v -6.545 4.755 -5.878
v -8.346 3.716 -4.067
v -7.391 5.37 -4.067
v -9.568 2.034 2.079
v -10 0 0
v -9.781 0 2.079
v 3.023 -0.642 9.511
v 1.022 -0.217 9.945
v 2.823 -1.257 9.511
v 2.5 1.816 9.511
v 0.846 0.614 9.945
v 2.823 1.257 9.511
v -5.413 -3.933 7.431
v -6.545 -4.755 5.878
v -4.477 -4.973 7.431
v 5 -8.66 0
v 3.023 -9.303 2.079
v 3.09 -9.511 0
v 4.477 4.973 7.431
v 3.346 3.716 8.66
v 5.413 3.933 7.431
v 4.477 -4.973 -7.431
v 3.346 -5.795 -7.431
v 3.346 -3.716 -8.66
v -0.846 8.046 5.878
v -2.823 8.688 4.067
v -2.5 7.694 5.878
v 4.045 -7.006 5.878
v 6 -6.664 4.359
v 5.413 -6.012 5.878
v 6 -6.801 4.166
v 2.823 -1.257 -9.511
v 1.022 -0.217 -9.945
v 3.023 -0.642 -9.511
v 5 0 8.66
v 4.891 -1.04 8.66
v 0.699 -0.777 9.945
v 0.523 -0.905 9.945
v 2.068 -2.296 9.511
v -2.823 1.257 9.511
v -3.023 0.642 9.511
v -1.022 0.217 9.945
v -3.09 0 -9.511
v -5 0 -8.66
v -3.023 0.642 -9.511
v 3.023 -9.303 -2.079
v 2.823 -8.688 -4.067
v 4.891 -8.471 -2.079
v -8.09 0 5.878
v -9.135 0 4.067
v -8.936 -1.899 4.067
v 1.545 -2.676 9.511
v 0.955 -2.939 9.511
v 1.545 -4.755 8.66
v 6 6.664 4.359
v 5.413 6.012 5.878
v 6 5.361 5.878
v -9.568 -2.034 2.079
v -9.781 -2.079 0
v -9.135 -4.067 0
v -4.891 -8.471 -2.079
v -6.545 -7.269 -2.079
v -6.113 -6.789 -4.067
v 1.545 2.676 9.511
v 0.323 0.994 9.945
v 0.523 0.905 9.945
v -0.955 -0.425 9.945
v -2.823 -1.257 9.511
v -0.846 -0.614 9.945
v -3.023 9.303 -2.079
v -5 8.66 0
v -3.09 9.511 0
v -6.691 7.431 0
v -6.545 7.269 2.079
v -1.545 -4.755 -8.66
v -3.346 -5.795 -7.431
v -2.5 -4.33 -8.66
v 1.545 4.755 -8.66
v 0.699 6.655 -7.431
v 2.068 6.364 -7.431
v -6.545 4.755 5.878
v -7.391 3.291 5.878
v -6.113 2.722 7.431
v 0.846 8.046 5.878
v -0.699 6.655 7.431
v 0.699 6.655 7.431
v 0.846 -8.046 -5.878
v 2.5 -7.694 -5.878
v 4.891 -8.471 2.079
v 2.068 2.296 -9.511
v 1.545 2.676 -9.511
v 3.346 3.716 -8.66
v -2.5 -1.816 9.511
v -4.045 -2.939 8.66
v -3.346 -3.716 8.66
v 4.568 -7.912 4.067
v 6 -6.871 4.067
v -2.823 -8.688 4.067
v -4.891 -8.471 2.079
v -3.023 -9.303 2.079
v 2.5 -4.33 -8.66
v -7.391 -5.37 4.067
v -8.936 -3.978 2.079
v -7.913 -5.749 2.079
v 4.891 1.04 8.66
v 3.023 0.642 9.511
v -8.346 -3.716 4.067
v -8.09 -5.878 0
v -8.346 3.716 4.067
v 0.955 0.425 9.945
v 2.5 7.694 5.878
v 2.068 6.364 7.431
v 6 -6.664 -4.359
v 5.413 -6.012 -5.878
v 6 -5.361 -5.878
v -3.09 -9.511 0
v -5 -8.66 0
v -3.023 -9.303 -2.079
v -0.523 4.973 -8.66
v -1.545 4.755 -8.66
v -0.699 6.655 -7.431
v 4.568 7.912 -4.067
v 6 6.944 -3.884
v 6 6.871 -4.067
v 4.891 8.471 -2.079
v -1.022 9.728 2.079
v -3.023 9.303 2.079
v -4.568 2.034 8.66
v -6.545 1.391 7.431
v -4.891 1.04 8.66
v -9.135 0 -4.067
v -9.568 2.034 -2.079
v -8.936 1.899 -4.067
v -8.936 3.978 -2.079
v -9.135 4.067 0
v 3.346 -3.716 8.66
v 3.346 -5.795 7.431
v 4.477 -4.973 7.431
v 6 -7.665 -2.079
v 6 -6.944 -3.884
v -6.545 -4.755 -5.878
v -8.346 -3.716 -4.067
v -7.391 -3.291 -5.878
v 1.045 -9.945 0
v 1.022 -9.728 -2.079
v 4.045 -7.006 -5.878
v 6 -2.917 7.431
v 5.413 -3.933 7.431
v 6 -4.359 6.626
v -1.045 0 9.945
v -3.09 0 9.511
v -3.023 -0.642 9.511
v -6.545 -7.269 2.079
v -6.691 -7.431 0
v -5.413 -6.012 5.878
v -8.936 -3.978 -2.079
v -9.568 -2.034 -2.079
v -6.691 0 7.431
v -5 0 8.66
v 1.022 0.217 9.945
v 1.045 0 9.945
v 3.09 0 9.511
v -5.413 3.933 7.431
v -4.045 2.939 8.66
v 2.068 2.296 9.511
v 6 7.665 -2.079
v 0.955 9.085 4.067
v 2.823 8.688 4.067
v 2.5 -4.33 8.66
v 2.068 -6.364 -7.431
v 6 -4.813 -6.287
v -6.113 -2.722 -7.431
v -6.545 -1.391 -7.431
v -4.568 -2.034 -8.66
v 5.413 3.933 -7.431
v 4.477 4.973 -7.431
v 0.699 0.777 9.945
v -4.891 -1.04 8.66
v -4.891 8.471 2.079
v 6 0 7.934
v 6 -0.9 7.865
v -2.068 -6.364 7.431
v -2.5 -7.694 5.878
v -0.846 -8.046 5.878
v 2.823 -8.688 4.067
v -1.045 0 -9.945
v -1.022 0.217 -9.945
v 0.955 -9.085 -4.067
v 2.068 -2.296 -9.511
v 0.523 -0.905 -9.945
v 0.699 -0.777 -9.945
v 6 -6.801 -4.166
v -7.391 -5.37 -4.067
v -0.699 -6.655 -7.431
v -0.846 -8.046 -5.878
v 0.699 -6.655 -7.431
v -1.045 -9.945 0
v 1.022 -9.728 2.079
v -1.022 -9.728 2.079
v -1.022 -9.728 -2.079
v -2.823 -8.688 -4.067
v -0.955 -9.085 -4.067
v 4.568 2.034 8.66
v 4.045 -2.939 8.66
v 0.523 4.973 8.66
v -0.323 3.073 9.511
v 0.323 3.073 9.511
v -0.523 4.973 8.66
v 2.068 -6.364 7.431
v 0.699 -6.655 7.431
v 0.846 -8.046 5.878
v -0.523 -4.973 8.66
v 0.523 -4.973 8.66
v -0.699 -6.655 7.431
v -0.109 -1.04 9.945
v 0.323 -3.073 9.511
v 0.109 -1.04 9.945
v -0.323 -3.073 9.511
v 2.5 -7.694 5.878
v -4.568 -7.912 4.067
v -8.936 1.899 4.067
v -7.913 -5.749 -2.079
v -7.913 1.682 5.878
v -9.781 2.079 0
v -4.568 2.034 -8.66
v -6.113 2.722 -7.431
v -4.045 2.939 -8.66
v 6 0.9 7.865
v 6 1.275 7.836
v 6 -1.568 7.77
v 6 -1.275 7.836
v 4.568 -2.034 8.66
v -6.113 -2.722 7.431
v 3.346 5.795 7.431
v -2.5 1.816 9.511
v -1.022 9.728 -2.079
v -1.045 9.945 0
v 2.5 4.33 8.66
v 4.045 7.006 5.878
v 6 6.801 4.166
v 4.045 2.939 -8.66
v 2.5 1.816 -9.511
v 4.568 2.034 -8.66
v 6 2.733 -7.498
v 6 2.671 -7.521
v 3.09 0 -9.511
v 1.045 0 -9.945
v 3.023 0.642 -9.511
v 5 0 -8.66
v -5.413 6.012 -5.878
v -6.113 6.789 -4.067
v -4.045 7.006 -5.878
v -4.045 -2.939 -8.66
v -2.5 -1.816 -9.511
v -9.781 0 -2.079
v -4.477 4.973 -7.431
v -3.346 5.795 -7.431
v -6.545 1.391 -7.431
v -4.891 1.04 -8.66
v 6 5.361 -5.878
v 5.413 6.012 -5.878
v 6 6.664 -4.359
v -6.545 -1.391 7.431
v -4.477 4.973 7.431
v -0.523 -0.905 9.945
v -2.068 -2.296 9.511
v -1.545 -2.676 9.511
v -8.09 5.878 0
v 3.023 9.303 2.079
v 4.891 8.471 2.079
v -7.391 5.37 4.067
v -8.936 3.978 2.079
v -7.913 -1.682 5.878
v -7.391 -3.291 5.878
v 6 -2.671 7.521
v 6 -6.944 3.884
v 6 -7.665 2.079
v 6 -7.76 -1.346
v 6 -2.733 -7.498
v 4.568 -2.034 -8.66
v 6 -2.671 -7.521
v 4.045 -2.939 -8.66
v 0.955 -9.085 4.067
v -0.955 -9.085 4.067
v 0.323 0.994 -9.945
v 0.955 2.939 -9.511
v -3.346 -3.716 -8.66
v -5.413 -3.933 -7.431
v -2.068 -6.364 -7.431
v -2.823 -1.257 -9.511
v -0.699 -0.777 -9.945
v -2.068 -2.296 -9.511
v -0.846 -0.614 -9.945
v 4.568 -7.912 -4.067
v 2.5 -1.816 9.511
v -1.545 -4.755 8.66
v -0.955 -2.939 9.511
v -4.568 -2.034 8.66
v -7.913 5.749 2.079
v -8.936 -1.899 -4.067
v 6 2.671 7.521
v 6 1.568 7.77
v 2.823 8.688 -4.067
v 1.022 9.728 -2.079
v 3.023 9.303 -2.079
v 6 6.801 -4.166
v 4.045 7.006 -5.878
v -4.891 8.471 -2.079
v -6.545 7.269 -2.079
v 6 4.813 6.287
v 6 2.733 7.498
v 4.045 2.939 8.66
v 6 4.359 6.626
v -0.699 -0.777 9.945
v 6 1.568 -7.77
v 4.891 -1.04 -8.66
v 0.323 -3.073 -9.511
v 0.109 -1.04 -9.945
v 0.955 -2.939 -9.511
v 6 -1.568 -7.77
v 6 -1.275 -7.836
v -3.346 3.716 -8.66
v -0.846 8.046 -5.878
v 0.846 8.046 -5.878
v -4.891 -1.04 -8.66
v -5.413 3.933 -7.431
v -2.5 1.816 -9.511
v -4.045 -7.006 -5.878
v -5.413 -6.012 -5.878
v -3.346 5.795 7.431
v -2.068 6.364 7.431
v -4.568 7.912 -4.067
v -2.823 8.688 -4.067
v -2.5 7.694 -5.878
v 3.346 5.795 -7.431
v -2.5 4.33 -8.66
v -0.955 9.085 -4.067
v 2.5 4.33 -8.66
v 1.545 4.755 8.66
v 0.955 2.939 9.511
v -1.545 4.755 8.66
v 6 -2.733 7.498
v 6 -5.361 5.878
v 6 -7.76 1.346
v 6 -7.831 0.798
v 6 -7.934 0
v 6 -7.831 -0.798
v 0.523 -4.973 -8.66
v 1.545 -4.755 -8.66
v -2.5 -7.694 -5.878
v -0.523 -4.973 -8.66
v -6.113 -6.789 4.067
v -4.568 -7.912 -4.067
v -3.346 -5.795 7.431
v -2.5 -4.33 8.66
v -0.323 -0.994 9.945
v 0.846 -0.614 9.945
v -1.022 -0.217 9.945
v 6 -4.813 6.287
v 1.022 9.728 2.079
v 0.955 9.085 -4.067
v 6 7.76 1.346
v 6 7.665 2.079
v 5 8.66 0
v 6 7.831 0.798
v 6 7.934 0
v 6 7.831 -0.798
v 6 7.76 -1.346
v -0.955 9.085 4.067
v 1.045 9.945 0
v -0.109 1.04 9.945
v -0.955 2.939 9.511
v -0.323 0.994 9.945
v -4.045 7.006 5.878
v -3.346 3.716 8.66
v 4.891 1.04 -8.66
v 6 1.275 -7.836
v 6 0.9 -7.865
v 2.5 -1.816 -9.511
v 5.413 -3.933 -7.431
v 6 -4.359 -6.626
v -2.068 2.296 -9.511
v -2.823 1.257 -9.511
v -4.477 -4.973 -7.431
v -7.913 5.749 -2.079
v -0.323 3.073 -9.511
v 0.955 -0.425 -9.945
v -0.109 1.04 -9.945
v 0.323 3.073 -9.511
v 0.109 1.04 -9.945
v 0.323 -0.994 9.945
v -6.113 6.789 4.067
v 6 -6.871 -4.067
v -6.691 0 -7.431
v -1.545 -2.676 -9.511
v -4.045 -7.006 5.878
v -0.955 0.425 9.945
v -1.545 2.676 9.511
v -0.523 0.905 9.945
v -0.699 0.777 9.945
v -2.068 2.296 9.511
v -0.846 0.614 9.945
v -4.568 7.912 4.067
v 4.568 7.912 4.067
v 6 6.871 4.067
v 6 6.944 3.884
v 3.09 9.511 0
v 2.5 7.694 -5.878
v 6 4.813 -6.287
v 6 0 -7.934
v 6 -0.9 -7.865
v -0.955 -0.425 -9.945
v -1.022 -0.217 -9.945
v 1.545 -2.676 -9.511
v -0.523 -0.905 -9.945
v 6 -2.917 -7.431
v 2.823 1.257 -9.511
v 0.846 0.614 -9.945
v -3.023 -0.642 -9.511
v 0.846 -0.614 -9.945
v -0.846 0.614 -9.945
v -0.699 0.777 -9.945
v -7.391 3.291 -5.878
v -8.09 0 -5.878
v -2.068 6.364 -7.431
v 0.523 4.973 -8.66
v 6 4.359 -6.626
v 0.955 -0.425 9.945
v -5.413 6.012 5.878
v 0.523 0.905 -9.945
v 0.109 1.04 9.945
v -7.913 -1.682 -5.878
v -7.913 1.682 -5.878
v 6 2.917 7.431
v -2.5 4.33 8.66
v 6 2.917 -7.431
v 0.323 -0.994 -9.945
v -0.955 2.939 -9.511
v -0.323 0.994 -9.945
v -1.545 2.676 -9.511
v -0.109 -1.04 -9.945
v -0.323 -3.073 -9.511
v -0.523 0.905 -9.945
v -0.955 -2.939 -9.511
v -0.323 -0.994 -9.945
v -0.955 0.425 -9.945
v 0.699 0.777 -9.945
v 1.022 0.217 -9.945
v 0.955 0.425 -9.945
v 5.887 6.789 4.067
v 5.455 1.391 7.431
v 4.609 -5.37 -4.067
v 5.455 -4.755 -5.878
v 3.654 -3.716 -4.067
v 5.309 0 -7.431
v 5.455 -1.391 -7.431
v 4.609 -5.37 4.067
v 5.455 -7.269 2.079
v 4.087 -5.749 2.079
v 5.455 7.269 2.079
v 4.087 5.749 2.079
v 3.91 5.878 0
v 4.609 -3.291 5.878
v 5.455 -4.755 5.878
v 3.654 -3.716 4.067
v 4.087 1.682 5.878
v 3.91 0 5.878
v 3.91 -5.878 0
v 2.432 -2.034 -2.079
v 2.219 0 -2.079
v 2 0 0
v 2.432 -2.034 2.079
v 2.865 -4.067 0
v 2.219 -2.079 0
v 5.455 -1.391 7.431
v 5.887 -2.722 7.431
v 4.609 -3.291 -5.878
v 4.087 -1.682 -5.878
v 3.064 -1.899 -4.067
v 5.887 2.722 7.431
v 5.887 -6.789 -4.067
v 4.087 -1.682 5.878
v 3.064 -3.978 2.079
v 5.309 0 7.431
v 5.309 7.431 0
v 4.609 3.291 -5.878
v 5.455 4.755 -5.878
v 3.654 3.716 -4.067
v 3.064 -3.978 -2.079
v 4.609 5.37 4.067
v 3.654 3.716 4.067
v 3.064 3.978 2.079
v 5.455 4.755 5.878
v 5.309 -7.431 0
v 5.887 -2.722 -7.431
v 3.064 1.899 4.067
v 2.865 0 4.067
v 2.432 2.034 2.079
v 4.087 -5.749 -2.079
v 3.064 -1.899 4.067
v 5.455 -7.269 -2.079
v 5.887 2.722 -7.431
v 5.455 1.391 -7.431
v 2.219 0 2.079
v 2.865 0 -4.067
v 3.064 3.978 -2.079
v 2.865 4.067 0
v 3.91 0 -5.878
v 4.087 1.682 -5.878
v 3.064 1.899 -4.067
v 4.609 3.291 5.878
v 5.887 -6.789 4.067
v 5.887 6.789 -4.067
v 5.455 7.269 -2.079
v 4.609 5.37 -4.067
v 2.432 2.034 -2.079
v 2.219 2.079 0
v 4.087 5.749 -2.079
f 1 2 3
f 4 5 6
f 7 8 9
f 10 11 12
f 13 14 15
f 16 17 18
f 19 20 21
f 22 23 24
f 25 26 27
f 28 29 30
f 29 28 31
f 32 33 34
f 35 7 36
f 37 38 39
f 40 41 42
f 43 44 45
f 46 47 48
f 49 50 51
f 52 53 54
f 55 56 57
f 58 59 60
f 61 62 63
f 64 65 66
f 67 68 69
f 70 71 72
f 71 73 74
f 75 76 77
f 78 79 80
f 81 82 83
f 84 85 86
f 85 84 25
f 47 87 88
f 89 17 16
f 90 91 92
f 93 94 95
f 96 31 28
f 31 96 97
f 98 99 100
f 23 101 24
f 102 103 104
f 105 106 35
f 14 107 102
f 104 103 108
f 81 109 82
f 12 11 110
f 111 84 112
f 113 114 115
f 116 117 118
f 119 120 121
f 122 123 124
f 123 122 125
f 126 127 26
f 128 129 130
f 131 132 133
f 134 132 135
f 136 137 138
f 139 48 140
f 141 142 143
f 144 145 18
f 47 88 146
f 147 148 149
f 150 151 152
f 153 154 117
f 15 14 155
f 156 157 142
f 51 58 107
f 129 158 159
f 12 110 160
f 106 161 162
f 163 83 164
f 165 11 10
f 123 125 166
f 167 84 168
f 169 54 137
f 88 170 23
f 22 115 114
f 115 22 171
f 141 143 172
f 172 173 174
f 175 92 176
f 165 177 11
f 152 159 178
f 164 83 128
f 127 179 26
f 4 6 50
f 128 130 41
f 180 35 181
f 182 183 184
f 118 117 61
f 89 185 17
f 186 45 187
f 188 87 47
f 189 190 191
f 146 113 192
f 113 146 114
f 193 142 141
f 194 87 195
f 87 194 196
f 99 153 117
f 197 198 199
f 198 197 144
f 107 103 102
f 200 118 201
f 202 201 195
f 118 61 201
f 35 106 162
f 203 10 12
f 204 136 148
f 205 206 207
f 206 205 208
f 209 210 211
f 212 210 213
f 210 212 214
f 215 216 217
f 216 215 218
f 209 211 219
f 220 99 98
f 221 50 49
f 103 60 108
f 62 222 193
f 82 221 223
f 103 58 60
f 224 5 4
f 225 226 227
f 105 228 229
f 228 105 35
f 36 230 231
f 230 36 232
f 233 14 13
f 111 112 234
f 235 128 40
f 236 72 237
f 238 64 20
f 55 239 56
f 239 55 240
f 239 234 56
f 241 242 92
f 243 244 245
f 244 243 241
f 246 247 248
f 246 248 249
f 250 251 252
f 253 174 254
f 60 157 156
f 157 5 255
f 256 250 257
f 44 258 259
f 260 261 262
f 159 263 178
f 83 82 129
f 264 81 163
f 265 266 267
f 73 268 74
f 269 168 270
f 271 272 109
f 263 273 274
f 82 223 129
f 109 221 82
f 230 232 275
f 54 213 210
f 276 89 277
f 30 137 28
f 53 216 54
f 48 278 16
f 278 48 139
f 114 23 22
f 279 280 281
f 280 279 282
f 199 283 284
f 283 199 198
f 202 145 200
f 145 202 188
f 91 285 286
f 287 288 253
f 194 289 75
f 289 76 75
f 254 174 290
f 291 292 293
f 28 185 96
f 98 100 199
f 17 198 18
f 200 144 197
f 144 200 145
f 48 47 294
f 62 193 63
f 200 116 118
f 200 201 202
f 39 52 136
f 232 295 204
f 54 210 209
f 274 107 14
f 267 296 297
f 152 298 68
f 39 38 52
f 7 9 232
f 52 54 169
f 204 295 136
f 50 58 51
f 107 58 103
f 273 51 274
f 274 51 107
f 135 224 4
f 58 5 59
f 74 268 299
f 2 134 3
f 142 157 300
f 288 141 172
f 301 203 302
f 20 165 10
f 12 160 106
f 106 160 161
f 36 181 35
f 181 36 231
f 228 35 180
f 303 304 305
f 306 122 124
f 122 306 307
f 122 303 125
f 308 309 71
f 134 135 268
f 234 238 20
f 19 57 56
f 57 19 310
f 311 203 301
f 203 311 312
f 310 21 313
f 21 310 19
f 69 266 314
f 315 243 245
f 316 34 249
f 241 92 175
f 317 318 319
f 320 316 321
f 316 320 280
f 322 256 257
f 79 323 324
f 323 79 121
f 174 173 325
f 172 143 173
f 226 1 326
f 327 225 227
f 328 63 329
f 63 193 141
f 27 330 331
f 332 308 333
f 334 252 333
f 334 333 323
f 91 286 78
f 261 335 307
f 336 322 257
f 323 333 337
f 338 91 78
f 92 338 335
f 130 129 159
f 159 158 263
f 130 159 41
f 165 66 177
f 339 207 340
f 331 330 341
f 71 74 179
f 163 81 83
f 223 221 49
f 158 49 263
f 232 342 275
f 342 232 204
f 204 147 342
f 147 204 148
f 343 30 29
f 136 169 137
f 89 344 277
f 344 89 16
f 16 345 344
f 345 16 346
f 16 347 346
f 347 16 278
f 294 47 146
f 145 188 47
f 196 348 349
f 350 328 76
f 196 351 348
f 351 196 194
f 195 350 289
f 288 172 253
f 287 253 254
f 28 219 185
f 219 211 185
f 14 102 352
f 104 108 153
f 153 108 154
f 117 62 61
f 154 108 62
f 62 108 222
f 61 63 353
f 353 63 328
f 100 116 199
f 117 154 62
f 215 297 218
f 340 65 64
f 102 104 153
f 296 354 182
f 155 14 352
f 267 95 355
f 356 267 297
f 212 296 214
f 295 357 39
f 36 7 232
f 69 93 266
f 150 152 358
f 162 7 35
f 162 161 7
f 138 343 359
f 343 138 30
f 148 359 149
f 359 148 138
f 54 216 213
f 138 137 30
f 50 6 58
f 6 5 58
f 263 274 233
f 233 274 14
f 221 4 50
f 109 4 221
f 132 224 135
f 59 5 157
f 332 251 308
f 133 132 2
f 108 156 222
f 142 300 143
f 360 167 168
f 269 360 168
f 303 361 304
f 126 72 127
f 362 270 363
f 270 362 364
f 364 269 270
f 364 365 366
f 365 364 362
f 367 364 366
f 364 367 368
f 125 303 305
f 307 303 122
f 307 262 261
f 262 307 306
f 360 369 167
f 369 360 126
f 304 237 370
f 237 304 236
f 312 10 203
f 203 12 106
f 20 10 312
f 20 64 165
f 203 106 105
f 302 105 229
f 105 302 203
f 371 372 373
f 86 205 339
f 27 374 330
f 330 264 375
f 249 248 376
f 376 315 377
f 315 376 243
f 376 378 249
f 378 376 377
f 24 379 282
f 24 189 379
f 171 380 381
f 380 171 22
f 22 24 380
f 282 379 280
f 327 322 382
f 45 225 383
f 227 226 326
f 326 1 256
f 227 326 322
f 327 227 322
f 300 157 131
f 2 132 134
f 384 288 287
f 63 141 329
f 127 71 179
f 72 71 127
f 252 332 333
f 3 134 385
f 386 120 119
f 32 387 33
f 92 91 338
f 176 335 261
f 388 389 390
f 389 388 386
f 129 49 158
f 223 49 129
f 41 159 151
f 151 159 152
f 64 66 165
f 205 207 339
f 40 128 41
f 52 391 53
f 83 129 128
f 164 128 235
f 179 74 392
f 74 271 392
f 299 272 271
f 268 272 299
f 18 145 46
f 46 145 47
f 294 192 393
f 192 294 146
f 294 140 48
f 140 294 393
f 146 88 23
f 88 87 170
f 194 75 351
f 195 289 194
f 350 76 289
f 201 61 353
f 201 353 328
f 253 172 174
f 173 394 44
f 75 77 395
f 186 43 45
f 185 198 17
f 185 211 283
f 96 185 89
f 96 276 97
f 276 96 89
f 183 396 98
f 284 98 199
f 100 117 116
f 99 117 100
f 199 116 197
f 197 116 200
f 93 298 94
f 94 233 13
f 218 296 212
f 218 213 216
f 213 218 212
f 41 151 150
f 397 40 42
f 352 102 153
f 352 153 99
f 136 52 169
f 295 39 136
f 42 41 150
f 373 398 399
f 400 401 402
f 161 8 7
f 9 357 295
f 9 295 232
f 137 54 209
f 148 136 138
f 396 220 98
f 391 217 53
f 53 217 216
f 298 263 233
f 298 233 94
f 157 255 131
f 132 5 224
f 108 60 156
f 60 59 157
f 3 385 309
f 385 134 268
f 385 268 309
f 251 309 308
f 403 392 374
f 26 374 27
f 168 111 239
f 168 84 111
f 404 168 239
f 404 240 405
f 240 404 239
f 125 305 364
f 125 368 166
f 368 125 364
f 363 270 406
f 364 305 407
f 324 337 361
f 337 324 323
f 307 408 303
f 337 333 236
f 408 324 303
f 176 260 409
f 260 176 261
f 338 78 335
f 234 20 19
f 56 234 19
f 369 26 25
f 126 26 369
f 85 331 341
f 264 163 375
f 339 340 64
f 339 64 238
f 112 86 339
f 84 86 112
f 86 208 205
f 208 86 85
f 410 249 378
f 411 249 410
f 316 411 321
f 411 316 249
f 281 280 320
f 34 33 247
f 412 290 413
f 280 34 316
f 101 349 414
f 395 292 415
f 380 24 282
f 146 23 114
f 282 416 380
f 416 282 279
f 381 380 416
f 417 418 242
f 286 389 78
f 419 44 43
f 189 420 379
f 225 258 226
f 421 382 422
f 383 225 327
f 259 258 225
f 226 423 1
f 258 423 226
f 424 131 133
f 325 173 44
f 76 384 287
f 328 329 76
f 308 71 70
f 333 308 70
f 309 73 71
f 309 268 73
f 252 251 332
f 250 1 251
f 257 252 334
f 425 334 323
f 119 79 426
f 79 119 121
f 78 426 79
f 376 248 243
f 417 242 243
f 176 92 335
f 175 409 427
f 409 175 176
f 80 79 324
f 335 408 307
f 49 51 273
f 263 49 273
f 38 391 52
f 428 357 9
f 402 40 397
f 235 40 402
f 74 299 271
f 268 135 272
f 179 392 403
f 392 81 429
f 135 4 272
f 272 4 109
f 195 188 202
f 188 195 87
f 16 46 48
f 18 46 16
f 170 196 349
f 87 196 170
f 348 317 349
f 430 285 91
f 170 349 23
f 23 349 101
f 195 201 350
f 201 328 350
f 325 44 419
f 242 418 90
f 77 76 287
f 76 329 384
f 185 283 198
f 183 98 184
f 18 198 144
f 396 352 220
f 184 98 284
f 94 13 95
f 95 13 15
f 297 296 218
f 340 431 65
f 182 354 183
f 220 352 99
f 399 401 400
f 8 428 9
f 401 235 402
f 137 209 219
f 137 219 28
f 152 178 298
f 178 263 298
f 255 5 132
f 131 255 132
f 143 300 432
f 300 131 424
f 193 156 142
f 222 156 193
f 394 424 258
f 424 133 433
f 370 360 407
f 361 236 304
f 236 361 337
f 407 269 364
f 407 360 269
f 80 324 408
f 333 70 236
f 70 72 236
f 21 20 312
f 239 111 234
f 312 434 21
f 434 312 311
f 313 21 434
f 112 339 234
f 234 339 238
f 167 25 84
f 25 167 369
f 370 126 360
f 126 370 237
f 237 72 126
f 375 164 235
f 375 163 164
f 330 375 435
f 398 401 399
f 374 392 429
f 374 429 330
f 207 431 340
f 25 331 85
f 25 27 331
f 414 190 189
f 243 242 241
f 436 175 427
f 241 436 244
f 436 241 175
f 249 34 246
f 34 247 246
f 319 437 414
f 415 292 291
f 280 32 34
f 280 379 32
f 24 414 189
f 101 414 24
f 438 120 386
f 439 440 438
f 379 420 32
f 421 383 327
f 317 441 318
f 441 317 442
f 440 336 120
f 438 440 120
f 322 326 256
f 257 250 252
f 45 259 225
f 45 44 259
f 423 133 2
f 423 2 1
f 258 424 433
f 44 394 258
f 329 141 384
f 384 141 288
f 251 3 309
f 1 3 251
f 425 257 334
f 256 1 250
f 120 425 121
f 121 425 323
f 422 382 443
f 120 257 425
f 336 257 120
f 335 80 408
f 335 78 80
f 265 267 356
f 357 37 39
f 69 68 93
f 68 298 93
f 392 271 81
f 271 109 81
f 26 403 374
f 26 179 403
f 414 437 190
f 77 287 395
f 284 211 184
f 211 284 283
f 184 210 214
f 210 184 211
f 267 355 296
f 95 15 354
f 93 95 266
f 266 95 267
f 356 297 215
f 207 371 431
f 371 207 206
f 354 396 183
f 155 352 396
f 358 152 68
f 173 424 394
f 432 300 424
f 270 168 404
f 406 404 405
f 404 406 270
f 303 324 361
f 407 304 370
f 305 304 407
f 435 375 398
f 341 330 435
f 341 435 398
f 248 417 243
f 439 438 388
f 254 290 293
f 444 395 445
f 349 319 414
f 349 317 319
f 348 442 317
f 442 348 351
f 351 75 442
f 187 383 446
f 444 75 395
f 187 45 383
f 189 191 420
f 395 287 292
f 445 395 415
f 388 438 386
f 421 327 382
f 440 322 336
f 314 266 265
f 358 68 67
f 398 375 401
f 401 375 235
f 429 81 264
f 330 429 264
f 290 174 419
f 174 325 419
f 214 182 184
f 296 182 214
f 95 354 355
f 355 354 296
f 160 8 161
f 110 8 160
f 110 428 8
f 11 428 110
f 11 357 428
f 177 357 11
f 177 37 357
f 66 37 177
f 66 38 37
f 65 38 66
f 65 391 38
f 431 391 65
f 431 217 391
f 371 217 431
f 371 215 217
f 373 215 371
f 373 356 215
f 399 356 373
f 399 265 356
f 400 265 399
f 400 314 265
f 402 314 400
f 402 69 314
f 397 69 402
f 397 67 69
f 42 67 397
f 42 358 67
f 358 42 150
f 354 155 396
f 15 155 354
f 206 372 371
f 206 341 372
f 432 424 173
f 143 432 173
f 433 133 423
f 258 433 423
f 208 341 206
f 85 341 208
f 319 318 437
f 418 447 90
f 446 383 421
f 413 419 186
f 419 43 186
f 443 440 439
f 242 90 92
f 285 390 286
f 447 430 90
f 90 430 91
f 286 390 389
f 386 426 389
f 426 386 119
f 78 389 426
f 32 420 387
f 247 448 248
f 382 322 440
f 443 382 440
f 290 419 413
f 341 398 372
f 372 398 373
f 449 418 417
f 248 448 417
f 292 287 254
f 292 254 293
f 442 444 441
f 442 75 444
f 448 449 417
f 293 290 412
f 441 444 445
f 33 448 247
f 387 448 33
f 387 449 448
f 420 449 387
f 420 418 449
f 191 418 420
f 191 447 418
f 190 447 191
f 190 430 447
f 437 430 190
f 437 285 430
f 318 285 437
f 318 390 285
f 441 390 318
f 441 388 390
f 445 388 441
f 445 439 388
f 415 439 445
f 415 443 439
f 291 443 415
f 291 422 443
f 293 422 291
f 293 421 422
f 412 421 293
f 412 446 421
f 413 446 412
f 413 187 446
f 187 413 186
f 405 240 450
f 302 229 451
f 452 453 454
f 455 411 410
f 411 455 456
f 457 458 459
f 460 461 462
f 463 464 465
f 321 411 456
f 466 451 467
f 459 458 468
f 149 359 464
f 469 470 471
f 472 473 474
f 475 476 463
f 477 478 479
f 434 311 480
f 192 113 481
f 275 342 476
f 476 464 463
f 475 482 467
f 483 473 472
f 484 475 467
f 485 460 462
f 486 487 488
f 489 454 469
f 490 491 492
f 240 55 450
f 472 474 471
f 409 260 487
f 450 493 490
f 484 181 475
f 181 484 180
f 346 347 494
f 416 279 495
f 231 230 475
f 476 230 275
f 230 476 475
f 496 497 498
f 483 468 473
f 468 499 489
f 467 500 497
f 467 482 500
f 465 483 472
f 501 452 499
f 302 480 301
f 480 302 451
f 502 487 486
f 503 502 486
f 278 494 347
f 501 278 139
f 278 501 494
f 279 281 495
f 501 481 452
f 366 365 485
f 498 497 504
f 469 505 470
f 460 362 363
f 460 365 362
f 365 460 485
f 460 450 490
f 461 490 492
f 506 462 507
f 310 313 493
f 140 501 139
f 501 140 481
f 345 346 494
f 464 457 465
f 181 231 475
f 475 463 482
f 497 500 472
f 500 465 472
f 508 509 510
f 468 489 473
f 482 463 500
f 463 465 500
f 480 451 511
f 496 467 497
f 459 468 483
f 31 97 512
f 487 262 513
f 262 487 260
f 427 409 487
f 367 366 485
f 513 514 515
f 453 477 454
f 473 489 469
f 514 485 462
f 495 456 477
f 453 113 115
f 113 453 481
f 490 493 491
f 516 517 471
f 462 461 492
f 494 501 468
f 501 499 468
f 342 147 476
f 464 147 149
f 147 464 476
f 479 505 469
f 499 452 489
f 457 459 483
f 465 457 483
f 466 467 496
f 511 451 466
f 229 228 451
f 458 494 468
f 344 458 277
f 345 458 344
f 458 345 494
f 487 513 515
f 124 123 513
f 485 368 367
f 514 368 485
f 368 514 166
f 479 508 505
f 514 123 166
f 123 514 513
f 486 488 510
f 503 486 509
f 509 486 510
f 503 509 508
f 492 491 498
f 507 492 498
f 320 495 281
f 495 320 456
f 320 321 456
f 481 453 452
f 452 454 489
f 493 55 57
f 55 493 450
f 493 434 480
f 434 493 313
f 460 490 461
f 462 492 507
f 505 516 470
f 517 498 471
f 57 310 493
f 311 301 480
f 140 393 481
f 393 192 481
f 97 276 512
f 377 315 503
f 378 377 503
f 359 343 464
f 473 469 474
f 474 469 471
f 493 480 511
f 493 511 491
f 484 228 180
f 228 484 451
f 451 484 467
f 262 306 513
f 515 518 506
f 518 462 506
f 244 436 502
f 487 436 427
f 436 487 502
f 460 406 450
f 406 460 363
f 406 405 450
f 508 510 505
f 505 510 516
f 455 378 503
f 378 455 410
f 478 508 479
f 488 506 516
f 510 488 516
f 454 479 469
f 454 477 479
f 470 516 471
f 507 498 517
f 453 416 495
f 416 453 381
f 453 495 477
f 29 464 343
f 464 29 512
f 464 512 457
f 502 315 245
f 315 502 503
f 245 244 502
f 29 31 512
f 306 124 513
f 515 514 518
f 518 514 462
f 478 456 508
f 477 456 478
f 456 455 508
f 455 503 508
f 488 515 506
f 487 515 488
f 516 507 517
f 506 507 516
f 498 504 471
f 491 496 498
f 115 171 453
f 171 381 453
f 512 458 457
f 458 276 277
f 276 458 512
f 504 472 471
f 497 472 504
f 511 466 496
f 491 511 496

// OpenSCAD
difference() {
    sphere(r=10);
    translate([12,0,0])
        sphere(r=10);
}
